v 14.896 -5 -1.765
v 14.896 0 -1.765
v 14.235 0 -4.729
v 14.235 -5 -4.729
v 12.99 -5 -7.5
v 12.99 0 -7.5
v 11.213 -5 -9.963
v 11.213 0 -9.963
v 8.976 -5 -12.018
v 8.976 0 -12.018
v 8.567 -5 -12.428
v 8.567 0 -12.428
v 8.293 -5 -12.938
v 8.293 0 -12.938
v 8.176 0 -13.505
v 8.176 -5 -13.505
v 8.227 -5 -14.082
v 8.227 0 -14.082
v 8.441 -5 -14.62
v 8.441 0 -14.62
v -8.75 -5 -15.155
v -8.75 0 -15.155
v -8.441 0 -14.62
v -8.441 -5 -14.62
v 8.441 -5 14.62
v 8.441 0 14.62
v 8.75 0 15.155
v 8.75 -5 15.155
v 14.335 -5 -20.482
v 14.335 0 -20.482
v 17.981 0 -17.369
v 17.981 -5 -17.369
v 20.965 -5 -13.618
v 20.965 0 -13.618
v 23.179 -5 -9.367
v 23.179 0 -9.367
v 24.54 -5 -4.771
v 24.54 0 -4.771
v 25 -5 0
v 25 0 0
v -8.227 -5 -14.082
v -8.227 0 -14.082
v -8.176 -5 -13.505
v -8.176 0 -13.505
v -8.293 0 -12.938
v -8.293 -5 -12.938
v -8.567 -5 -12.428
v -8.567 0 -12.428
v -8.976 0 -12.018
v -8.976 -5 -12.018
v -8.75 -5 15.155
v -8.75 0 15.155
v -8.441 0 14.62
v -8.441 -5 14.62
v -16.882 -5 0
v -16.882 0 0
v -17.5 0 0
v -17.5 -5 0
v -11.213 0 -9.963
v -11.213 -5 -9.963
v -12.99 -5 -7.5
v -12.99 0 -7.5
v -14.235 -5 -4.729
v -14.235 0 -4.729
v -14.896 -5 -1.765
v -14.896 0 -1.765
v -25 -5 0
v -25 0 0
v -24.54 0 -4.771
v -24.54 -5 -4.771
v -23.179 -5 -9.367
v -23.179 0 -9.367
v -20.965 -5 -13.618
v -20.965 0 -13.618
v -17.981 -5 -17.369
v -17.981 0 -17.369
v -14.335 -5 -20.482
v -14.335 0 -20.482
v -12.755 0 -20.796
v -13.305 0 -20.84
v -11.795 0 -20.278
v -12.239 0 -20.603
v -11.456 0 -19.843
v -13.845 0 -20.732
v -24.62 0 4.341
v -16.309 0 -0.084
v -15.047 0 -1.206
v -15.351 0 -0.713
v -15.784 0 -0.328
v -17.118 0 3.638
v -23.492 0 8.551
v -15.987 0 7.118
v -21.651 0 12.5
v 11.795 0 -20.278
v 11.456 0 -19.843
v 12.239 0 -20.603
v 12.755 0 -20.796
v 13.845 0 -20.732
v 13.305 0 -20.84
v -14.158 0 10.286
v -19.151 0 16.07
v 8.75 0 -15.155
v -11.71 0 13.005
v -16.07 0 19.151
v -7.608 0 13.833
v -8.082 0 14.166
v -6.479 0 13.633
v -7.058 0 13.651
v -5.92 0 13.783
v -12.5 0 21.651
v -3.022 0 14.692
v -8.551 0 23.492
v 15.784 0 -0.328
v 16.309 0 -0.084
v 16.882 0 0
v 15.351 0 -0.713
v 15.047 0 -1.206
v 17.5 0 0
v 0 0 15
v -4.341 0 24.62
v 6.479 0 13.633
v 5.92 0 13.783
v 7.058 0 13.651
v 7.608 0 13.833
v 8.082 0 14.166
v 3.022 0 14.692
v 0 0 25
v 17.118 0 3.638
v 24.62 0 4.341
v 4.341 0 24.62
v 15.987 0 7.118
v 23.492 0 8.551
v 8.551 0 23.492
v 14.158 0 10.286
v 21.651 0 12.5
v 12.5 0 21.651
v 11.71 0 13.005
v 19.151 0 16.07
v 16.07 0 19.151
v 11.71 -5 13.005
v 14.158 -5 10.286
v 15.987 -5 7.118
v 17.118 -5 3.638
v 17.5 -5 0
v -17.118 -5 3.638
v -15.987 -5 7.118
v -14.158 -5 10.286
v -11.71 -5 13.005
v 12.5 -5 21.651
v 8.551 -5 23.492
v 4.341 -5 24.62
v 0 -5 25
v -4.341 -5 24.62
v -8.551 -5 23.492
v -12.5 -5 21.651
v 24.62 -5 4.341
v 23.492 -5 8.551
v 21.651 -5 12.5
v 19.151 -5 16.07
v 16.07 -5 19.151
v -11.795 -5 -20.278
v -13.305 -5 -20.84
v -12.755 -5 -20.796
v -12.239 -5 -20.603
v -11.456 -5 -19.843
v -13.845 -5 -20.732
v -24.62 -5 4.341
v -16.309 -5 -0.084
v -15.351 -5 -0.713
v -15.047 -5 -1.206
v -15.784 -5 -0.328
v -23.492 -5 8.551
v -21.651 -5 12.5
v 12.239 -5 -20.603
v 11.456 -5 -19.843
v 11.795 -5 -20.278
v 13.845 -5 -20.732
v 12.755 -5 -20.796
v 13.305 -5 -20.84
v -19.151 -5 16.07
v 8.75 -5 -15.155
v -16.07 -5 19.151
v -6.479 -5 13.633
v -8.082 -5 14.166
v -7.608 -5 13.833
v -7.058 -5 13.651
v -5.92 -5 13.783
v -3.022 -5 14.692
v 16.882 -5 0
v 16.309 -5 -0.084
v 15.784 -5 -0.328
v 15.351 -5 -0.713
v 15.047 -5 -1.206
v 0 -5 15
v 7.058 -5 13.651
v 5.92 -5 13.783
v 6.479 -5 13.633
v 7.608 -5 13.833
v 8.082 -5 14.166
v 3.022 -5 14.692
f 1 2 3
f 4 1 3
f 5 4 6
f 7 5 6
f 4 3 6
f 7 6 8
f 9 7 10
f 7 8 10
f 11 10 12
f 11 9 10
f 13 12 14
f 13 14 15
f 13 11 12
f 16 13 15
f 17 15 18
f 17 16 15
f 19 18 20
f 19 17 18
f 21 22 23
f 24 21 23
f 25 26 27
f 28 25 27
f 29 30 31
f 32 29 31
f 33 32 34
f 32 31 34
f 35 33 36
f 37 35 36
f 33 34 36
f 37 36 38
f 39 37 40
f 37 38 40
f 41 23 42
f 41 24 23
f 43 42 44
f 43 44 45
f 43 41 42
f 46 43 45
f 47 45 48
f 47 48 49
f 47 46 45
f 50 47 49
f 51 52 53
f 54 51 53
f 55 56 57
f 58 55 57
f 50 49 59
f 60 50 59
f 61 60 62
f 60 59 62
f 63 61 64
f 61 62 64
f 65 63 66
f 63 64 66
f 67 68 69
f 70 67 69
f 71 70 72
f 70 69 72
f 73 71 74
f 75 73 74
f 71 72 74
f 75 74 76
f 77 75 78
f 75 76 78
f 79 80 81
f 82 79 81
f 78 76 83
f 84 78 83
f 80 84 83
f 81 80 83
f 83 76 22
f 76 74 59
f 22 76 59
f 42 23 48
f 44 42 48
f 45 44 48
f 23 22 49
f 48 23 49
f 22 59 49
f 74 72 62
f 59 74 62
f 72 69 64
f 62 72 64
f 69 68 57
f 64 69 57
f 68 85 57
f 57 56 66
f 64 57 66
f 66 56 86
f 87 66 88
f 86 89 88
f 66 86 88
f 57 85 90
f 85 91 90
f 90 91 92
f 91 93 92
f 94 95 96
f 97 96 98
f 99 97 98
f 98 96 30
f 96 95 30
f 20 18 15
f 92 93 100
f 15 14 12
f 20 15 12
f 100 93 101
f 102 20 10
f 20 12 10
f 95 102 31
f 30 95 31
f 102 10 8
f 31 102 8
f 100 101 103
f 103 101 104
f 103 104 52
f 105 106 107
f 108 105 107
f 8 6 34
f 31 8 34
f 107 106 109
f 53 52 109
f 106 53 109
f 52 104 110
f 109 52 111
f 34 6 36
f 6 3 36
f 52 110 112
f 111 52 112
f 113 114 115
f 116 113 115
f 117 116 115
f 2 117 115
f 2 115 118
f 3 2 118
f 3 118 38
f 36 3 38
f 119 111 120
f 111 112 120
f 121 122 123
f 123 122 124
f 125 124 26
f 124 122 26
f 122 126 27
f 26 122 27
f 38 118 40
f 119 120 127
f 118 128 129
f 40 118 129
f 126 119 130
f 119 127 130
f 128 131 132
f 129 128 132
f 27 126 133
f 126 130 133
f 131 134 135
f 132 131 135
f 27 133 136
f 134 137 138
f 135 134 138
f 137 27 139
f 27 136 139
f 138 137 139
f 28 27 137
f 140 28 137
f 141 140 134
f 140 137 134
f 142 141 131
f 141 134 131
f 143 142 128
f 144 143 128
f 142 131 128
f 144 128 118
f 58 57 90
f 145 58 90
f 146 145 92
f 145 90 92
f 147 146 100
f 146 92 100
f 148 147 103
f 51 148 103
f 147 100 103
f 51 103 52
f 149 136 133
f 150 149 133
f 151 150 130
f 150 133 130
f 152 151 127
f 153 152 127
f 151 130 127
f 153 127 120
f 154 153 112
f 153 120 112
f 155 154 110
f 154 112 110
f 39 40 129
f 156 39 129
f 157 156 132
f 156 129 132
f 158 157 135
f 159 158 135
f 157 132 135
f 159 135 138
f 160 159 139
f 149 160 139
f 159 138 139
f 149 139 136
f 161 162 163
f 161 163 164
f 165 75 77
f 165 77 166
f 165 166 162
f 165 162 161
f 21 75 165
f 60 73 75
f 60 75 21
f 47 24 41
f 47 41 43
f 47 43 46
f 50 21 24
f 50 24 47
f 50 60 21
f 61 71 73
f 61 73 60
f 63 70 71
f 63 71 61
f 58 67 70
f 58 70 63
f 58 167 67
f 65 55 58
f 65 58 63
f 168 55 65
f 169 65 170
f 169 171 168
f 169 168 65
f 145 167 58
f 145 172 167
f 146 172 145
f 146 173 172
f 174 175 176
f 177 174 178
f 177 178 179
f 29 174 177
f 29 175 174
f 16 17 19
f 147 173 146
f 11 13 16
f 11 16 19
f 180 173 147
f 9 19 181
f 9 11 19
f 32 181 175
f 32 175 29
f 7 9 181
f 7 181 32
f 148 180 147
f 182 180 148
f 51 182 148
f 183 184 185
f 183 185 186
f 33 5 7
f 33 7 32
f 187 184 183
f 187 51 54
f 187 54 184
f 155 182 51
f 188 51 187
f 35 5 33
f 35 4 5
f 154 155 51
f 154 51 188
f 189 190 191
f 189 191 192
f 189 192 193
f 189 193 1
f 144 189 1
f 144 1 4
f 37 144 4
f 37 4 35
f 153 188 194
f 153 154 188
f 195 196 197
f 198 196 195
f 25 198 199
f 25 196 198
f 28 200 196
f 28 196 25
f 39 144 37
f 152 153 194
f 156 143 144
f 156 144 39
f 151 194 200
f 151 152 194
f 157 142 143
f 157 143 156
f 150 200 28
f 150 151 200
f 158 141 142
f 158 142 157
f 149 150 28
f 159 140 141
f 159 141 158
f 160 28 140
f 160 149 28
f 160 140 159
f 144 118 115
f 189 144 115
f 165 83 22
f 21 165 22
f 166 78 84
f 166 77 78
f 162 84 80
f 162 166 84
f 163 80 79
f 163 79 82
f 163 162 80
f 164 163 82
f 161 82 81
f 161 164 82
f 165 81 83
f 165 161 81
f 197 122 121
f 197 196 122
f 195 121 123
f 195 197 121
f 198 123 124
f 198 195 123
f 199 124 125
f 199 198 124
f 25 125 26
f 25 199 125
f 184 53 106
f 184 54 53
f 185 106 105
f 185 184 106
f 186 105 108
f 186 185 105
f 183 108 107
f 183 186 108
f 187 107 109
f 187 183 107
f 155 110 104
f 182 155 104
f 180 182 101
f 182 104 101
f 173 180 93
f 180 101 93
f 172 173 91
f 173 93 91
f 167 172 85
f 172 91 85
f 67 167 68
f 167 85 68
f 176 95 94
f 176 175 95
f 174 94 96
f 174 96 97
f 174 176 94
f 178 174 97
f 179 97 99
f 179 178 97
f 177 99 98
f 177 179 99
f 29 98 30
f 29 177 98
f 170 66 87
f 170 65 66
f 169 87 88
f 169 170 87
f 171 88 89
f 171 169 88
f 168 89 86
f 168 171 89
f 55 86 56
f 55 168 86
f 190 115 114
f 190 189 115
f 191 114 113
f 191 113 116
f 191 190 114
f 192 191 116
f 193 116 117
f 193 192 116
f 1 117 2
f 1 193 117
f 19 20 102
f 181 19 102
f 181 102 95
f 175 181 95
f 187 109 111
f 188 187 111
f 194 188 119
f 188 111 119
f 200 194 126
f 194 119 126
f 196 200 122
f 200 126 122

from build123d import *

# Parameters (mm, degrees)
F1_DEPTH = 5
F2_R     = 2


with BuildPart() as f1:
    # F0 (on Front) → F1 (new body)
    with BuildSketch(Plane.XZ):
        with BuildLine():
            Line((-8.75, 15.1554445662), (-12.5, 21.6506350946))
            ThreePointArc((-12.5, 21.6506350946), (-21.6506350946, 12.5), (-25, 0))
            Line((-25, 0), (-17.5, 0))
            ThreePointArc((-17.5, 0), (-15.1554445662, 8.75), (-8.75, 15.1554445662))
        make_face()
        with BuildLine():
            Line((-17.5, 0), (-25, 0))
            ThreePointArc((-25, 0), (-21.6506350946, -12.5), (-12.5, -21.6506350946))
            Line((-12.5, -21.6506350946), (-8.75, -15.1554445662))
            ThreePointArc((-8.75, -15.1554445662), (-15.1554445662, -8.75), (-17.5, 0))
        make_face()
        with BuildLine():
            Line((-15, 0), (-17.5, 0))
            ThreePointArc((-17.5, 0), (-15.1554445662, -8.75), (-8.75, -15.1554445662))
            Line((-8.75, -15.1554445662), (-7.5, -12.9903810568))
            ThreePointArc((-7.5, -12.9903810568), (-12.9903810568, -7.5), (-15, 0))
        make_face()
        with BuildLine():
            Line((7.5, 12.9903810568), (8.75, 15.1554445662))
            ThreePointArc((8.75, 15.1554445662), (0, 17.5), (-8.75, 15.1554445662))
            Line((-8.75, 15.1554445662), (-7.5, 12.9903810568))
            ThreePointArc((-7.5, 12.9903810568), (0, 15), (7.5, 12.9903810568))
        make_face()
        with BuildLine():
            Line((8.75, 15.1554445662), (12.5, 21.6506350946))
            ThreePointArc((12.5, 21.6506350946), (0, 25), (-12.5, 21.6506350946))
            Line((-12.5, 21.6506350946), (-8.75, 15.1554445662))
            ThreePointArc((-8.75, 15.1554445662), (0, 17.5), (8.75, 15.1554445662))
        make_face()
        with BuildLine():
            Line((17.5, 0), (25, 0))
            ThreePointArc((25, 0), (21.6506350946, 12.5), (12.5, 21.6506350946))
            Line((12.5, 21.6506350946), (8.75, 15.1554445662))
            ThreePointArc((8.75, 15.1554445662), (15.1554445662, 8.75), (17.5, 0))
        make_face()
        with BuildLine():
            Line((7.5, -12.9903810568), (8.75, -15.1554445662))
            ThreePointArc((8.75, -15.1554445662), (15.1554445662, -8.75), (17.5, 0))
            Line((17.5, 0), (15, 0))
            ThreePointArc((15, 0), (12.9903810568, -7.5), (7.5, -12.9903810568))
        make_face()
        with BuildLine():
            Line((8.75, -15.1554445662), (12.5, -21.6506350946))
            ThreePointArc((12.5, -21.6506350946), (21.6506350946, -12.5), (25, 0))
            Line((25, 0), (17.5, 0))
            ThreePointArc((17.5, 0), (15.1554445662, -8.75), (8.75, -15.1554445662))
        make_face()
    extrude(amount=F1_DEPTH)

    # F2
    f2_edges = [f1.edges().sort_by_distance(p)[0] for p in [
        (7.5, -2.5, 12.990381),
        (-7.5, -2.5, 12.990381),
        (-15, -2.5, 0),
        (-7.5, -2.5, -12.990381),
        (7.5, -2.5, -12.990381),
        (15, -2.5, 0),
        (-12.5, -2.5, -21.650635),
        (12.5, -2.5, -21.650635),
    ]]
    fillet(f2_edges, radius=F2_R)


solid = f1.part
